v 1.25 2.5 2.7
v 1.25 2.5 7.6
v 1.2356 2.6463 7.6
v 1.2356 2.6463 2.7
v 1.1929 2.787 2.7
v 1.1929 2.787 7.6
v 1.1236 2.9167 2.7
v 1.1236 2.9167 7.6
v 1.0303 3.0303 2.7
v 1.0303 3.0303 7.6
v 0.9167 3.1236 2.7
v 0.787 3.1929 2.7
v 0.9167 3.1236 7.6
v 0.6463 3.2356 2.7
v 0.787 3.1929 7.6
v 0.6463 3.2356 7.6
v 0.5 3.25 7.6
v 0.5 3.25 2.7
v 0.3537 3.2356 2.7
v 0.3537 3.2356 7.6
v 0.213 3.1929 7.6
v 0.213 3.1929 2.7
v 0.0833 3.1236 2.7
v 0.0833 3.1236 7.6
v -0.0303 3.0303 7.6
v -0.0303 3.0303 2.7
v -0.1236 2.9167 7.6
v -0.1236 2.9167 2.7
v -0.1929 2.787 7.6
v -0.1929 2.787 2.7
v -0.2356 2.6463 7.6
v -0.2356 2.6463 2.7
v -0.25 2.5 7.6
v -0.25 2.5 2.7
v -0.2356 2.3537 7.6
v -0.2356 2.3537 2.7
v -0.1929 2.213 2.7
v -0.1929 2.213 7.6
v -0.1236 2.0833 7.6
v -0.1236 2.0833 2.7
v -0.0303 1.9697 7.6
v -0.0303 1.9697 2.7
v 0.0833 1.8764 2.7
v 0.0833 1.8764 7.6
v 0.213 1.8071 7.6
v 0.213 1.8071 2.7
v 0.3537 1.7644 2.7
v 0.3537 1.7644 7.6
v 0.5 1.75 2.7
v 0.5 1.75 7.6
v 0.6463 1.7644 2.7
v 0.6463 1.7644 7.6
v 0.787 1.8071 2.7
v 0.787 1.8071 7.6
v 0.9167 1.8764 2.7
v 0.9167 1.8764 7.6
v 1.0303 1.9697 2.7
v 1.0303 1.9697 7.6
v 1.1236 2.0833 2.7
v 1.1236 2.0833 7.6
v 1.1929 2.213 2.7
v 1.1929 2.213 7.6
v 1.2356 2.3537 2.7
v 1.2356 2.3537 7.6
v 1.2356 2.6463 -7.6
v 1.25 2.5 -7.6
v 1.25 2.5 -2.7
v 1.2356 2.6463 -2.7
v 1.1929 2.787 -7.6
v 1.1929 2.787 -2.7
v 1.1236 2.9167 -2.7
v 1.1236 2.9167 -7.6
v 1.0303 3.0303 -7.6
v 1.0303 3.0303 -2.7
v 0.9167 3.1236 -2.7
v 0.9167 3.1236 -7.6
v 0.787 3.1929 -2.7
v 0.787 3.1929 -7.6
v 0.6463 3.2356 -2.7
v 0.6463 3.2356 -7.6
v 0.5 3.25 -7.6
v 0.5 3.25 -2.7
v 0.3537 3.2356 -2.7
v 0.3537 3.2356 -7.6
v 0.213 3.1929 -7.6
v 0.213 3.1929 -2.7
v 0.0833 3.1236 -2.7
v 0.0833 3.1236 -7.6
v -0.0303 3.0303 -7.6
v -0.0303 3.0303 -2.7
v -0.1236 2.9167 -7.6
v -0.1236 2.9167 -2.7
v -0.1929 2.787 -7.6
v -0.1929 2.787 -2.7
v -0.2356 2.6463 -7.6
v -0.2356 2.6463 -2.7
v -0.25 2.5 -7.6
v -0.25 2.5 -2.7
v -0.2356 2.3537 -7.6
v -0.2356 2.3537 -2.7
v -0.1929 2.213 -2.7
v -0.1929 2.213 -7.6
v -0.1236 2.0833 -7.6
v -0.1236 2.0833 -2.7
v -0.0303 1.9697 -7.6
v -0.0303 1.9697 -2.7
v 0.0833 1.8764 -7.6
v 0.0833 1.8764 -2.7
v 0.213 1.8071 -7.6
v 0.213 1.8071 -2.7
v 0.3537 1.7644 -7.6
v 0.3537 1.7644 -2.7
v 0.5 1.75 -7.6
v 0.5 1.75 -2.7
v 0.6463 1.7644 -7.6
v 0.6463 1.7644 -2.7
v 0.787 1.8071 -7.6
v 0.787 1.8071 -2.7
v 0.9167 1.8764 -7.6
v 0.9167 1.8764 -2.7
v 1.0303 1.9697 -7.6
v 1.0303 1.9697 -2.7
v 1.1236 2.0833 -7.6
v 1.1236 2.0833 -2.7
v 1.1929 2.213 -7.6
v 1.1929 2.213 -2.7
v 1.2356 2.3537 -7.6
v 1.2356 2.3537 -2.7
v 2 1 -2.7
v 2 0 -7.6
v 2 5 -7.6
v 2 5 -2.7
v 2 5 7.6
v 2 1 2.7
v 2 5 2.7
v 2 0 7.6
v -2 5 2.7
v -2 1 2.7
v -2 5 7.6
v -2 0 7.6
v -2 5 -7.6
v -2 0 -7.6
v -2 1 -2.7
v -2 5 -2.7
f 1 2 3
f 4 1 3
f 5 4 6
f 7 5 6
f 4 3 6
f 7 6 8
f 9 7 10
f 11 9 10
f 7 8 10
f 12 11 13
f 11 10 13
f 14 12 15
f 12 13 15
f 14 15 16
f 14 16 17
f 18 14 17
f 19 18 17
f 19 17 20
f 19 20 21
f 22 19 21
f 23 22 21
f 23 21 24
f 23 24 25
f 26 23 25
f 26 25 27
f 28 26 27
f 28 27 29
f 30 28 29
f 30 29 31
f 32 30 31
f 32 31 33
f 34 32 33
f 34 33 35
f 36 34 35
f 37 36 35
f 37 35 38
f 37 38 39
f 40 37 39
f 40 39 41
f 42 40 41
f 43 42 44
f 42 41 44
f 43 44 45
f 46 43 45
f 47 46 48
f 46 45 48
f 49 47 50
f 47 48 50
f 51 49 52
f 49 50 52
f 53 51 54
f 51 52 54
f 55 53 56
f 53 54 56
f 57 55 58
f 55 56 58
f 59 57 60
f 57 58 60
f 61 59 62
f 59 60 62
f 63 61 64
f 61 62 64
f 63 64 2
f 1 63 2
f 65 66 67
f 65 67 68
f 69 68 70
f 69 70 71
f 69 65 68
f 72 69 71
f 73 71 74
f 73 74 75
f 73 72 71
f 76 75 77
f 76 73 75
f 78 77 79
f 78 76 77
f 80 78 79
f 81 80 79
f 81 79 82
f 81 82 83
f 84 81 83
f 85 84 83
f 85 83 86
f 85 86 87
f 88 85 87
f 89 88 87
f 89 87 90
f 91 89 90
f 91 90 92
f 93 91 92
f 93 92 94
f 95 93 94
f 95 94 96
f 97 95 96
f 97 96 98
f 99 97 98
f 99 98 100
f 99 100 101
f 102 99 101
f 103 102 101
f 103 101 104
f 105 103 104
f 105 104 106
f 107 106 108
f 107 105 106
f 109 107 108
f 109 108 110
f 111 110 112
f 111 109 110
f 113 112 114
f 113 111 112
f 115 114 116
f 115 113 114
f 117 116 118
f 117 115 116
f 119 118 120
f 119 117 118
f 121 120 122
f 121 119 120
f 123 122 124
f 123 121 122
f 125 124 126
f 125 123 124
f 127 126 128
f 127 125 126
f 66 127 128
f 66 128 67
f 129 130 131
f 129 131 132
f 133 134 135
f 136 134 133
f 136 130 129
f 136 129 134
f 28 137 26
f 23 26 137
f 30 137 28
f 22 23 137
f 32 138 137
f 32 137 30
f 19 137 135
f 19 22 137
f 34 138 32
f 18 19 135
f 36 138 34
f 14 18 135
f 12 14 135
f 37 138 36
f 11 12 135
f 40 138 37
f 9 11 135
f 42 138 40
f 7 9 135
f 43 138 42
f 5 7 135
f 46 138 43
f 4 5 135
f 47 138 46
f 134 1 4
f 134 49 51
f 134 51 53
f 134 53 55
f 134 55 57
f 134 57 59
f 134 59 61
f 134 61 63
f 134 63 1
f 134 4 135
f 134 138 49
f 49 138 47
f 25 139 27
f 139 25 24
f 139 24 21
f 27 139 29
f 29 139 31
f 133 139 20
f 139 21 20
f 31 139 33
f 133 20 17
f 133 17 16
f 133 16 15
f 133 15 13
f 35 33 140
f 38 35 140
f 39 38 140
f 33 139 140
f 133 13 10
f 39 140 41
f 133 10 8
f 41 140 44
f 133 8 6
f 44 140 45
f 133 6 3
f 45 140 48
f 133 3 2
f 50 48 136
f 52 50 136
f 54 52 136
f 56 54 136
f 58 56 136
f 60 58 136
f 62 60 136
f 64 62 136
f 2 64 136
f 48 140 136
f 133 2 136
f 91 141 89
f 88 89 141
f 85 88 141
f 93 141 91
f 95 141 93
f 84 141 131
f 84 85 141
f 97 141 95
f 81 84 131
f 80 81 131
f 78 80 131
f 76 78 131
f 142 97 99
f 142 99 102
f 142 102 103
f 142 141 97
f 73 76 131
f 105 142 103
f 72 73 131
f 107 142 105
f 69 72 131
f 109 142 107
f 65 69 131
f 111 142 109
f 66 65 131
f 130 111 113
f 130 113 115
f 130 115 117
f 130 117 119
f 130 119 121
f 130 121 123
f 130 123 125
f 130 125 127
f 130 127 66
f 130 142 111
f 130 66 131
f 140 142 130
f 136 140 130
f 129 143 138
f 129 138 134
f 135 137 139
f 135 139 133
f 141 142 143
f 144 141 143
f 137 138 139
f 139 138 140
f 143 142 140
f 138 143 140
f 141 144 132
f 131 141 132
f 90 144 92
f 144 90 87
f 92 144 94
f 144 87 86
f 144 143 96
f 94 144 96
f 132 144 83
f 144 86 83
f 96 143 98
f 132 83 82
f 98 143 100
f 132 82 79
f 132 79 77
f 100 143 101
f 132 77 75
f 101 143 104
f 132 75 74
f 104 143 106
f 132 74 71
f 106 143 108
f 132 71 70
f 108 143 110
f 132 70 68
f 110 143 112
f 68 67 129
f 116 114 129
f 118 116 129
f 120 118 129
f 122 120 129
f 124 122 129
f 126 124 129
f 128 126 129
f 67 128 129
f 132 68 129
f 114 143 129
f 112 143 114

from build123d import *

# Parameters (mm, degrees)
SKETCH1_W           = 4
SKETCH1_H           = 15.2
BOSS_EXTRUDE1_DEPTH = 1
SKETCH2_W           = 4
SKETCH2_H           = 4.9
BOSS_EXTRUDE2_DEPTH = 4
CUT_EXTRUDE2_REACH  = 18.126
SKETCH4_R           = 0.75


with BuildPart() as part:
    # Sketch1 → Boss-Extrude1 (new body)
    with BuildSketch(Plane(origin=(0, 0, 0), x_dir=(1, 0, 0), z_dir=(0, 1, 0))):
        Rectangle(SKETCH1_W, SKETCH1_H)
    extrude(amount=BOSS_EXTRUDE1_DEPTH)

    # Sketch2 → Boss-Extrude2 (add)
    with BuildSketch(Plane(origin=(0, 1, 0), x_dir=(1, 0, 0), z_dir=(0, 1, 0))):
        with Locations((0, -5.15)):
            Rectangle(SKETCH2_W, SKETCH2_H)
    boss_extrude2 = extrude(amount=BOSS_EXTRUDE2_DEPTH)

    # Sketch4 → Cut-Extrude2 (cut, up to next)
    with BuildSketch(Plane.XY.offset(7.6), mode=Mode.PRIVATE) as cut_extrude2_sk1:
        with Locations((0.5, 2.5)):
            Circle(SKETCH4_R)
    cut_extrude2_tool1 = extrude(cut_extrude2_sk1.sketch, amount=-CUT_EXTRUDE2_REACH, mode=Mode.PRIVATE) & part.part
    cut_extrude2 = cut_extrude2_tool1.solids().sort_by_distance((0.5, 2.5, 7.6))[0]
    add(cut_extrude2, mode=Mode.SUBTRACT)

    # Mirror3: Boss-Extrude2, Cut-Extrude2 across plane
    add(boss_extrude2.mirror(Plane.XY))
    add(cut_extrude2.mirror(Plane.XY), mode=Mode.SUBTRACT)


solid = part.part
